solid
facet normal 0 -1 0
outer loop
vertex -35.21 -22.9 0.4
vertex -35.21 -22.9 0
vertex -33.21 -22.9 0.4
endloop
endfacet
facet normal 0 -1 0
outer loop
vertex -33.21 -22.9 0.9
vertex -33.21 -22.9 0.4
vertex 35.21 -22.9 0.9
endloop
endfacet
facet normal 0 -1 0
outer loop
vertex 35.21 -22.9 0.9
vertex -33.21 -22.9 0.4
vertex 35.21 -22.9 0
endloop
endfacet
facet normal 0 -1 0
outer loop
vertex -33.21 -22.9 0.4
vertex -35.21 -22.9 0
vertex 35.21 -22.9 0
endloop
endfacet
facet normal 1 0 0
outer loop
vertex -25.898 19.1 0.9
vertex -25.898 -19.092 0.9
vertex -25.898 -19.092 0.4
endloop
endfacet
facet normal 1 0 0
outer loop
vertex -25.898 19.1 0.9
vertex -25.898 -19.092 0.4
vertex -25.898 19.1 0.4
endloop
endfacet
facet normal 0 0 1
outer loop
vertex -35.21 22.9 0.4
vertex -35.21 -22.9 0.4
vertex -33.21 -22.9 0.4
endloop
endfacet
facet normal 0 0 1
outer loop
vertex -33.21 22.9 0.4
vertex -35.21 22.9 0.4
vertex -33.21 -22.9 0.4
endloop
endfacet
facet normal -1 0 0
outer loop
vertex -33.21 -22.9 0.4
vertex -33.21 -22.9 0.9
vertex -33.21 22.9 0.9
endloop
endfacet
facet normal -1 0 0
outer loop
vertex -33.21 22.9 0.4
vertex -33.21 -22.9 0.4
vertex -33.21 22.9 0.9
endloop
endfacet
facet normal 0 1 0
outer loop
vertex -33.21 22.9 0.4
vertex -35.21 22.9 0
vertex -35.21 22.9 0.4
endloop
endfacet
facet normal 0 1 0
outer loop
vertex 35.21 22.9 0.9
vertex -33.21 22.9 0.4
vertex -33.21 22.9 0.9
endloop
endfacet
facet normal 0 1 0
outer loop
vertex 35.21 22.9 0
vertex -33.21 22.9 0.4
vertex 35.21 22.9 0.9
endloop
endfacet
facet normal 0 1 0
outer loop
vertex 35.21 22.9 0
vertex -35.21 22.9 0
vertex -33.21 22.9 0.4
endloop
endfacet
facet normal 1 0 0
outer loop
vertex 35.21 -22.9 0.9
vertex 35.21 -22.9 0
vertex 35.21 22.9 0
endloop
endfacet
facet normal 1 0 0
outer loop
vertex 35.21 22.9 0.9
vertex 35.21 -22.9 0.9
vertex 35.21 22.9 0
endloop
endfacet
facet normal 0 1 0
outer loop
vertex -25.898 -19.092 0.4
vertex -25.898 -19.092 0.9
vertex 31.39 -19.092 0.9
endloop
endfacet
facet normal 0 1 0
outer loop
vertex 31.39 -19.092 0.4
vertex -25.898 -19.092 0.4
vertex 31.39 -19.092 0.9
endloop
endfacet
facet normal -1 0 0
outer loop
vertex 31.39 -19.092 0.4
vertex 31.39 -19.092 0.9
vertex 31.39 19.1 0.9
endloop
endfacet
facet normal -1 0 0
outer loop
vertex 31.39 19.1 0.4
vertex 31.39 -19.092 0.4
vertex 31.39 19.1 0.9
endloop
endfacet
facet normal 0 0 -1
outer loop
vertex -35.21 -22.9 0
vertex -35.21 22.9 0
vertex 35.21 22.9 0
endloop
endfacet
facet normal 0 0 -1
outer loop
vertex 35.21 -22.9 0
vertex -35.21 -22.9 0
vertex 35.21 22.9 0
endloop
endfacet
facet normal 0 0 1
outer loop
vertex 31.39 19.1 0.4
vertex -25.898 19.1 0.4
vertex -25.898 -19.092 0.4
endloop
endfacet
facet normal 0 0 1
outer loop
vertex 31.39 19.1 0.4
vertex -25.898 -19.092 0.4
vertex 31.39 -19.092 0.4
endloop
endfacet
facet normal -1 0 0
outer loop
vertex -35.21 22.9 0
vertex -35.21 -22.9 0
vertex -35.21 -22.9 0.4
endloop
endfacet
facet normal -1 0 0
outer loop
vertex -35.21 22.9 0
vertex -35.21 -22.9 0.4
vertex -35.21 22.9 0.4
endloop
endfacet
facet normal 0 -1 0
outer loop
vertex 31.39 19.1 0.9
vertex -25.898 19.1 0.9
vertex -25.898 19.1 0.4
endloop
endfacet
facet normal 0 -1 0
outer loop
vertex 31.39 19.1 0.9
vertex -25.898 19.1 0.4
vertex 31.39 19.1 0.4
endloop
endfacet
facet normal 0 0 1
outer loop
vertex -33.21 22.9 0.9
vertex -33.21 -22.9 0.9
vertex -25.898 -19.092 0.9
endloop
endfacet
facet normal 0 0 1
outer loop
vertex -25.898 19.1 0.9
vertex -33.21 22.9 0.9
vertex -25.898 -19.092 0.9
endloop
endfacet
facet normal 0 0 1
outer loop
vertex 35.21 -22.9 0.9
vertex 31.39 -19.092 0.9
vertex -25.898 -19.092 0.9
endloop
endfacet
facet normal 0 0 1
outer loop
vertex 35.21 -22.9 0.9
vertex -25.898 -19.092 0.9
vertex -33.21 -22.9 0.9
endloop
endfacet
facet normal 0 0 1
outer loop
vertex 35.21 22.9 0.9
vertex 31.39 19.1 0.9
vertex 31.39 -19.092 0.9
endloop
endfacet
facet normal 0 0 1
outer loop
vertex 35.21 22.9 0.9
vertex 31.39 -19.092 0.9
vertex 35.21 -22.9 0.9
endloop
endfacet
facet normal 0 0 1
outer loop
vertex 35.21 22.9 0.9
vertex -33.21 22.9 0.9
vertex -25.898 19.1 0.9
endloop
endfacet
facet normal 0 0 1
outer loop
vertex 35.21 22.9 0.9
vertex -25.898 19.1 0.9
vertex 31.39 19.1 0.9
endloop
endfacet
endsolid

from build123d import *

# Parameters (mm, degrees)
F0_W     = 70.42
F0_H     = 45.8
F1_DEPTH = 0.9
F2_W     = 57.288
F2_H     = 38.192
F3_DEPTH = 0.5
F4_W     = 2
F4_H     = 45.8
F5_DEPTH = 0.5


with BuildPart() as f1:
    # F0 (on Top) → F1 (new body)
    with BuildSketch(Plane.XY):
        Rectangle(F0_W, F0_H)
    extrude(amount=F1_DEPTH)

    # F2 (on face) → F3 (cut)
    with BuildSketch(Plane.XY.offset(0.9)):
        with Locations((2.746, 0.004)):
            Rectangle(F2_W, F2_H)
    extrude(amount=-F3_DEPTH, mode=Mode.SUBTRACT)

    # F4 (on face) → F5 (cut)
    with BuildSketch(Plane.XY.offset(0.9)):
        with Locations((-34.21, 0)):
            Rectangle(F4_W, F4_H)
    extrude(amount=-F5_DEPTH, mode=Mode.SUBTRACT)


solid = f1.part
